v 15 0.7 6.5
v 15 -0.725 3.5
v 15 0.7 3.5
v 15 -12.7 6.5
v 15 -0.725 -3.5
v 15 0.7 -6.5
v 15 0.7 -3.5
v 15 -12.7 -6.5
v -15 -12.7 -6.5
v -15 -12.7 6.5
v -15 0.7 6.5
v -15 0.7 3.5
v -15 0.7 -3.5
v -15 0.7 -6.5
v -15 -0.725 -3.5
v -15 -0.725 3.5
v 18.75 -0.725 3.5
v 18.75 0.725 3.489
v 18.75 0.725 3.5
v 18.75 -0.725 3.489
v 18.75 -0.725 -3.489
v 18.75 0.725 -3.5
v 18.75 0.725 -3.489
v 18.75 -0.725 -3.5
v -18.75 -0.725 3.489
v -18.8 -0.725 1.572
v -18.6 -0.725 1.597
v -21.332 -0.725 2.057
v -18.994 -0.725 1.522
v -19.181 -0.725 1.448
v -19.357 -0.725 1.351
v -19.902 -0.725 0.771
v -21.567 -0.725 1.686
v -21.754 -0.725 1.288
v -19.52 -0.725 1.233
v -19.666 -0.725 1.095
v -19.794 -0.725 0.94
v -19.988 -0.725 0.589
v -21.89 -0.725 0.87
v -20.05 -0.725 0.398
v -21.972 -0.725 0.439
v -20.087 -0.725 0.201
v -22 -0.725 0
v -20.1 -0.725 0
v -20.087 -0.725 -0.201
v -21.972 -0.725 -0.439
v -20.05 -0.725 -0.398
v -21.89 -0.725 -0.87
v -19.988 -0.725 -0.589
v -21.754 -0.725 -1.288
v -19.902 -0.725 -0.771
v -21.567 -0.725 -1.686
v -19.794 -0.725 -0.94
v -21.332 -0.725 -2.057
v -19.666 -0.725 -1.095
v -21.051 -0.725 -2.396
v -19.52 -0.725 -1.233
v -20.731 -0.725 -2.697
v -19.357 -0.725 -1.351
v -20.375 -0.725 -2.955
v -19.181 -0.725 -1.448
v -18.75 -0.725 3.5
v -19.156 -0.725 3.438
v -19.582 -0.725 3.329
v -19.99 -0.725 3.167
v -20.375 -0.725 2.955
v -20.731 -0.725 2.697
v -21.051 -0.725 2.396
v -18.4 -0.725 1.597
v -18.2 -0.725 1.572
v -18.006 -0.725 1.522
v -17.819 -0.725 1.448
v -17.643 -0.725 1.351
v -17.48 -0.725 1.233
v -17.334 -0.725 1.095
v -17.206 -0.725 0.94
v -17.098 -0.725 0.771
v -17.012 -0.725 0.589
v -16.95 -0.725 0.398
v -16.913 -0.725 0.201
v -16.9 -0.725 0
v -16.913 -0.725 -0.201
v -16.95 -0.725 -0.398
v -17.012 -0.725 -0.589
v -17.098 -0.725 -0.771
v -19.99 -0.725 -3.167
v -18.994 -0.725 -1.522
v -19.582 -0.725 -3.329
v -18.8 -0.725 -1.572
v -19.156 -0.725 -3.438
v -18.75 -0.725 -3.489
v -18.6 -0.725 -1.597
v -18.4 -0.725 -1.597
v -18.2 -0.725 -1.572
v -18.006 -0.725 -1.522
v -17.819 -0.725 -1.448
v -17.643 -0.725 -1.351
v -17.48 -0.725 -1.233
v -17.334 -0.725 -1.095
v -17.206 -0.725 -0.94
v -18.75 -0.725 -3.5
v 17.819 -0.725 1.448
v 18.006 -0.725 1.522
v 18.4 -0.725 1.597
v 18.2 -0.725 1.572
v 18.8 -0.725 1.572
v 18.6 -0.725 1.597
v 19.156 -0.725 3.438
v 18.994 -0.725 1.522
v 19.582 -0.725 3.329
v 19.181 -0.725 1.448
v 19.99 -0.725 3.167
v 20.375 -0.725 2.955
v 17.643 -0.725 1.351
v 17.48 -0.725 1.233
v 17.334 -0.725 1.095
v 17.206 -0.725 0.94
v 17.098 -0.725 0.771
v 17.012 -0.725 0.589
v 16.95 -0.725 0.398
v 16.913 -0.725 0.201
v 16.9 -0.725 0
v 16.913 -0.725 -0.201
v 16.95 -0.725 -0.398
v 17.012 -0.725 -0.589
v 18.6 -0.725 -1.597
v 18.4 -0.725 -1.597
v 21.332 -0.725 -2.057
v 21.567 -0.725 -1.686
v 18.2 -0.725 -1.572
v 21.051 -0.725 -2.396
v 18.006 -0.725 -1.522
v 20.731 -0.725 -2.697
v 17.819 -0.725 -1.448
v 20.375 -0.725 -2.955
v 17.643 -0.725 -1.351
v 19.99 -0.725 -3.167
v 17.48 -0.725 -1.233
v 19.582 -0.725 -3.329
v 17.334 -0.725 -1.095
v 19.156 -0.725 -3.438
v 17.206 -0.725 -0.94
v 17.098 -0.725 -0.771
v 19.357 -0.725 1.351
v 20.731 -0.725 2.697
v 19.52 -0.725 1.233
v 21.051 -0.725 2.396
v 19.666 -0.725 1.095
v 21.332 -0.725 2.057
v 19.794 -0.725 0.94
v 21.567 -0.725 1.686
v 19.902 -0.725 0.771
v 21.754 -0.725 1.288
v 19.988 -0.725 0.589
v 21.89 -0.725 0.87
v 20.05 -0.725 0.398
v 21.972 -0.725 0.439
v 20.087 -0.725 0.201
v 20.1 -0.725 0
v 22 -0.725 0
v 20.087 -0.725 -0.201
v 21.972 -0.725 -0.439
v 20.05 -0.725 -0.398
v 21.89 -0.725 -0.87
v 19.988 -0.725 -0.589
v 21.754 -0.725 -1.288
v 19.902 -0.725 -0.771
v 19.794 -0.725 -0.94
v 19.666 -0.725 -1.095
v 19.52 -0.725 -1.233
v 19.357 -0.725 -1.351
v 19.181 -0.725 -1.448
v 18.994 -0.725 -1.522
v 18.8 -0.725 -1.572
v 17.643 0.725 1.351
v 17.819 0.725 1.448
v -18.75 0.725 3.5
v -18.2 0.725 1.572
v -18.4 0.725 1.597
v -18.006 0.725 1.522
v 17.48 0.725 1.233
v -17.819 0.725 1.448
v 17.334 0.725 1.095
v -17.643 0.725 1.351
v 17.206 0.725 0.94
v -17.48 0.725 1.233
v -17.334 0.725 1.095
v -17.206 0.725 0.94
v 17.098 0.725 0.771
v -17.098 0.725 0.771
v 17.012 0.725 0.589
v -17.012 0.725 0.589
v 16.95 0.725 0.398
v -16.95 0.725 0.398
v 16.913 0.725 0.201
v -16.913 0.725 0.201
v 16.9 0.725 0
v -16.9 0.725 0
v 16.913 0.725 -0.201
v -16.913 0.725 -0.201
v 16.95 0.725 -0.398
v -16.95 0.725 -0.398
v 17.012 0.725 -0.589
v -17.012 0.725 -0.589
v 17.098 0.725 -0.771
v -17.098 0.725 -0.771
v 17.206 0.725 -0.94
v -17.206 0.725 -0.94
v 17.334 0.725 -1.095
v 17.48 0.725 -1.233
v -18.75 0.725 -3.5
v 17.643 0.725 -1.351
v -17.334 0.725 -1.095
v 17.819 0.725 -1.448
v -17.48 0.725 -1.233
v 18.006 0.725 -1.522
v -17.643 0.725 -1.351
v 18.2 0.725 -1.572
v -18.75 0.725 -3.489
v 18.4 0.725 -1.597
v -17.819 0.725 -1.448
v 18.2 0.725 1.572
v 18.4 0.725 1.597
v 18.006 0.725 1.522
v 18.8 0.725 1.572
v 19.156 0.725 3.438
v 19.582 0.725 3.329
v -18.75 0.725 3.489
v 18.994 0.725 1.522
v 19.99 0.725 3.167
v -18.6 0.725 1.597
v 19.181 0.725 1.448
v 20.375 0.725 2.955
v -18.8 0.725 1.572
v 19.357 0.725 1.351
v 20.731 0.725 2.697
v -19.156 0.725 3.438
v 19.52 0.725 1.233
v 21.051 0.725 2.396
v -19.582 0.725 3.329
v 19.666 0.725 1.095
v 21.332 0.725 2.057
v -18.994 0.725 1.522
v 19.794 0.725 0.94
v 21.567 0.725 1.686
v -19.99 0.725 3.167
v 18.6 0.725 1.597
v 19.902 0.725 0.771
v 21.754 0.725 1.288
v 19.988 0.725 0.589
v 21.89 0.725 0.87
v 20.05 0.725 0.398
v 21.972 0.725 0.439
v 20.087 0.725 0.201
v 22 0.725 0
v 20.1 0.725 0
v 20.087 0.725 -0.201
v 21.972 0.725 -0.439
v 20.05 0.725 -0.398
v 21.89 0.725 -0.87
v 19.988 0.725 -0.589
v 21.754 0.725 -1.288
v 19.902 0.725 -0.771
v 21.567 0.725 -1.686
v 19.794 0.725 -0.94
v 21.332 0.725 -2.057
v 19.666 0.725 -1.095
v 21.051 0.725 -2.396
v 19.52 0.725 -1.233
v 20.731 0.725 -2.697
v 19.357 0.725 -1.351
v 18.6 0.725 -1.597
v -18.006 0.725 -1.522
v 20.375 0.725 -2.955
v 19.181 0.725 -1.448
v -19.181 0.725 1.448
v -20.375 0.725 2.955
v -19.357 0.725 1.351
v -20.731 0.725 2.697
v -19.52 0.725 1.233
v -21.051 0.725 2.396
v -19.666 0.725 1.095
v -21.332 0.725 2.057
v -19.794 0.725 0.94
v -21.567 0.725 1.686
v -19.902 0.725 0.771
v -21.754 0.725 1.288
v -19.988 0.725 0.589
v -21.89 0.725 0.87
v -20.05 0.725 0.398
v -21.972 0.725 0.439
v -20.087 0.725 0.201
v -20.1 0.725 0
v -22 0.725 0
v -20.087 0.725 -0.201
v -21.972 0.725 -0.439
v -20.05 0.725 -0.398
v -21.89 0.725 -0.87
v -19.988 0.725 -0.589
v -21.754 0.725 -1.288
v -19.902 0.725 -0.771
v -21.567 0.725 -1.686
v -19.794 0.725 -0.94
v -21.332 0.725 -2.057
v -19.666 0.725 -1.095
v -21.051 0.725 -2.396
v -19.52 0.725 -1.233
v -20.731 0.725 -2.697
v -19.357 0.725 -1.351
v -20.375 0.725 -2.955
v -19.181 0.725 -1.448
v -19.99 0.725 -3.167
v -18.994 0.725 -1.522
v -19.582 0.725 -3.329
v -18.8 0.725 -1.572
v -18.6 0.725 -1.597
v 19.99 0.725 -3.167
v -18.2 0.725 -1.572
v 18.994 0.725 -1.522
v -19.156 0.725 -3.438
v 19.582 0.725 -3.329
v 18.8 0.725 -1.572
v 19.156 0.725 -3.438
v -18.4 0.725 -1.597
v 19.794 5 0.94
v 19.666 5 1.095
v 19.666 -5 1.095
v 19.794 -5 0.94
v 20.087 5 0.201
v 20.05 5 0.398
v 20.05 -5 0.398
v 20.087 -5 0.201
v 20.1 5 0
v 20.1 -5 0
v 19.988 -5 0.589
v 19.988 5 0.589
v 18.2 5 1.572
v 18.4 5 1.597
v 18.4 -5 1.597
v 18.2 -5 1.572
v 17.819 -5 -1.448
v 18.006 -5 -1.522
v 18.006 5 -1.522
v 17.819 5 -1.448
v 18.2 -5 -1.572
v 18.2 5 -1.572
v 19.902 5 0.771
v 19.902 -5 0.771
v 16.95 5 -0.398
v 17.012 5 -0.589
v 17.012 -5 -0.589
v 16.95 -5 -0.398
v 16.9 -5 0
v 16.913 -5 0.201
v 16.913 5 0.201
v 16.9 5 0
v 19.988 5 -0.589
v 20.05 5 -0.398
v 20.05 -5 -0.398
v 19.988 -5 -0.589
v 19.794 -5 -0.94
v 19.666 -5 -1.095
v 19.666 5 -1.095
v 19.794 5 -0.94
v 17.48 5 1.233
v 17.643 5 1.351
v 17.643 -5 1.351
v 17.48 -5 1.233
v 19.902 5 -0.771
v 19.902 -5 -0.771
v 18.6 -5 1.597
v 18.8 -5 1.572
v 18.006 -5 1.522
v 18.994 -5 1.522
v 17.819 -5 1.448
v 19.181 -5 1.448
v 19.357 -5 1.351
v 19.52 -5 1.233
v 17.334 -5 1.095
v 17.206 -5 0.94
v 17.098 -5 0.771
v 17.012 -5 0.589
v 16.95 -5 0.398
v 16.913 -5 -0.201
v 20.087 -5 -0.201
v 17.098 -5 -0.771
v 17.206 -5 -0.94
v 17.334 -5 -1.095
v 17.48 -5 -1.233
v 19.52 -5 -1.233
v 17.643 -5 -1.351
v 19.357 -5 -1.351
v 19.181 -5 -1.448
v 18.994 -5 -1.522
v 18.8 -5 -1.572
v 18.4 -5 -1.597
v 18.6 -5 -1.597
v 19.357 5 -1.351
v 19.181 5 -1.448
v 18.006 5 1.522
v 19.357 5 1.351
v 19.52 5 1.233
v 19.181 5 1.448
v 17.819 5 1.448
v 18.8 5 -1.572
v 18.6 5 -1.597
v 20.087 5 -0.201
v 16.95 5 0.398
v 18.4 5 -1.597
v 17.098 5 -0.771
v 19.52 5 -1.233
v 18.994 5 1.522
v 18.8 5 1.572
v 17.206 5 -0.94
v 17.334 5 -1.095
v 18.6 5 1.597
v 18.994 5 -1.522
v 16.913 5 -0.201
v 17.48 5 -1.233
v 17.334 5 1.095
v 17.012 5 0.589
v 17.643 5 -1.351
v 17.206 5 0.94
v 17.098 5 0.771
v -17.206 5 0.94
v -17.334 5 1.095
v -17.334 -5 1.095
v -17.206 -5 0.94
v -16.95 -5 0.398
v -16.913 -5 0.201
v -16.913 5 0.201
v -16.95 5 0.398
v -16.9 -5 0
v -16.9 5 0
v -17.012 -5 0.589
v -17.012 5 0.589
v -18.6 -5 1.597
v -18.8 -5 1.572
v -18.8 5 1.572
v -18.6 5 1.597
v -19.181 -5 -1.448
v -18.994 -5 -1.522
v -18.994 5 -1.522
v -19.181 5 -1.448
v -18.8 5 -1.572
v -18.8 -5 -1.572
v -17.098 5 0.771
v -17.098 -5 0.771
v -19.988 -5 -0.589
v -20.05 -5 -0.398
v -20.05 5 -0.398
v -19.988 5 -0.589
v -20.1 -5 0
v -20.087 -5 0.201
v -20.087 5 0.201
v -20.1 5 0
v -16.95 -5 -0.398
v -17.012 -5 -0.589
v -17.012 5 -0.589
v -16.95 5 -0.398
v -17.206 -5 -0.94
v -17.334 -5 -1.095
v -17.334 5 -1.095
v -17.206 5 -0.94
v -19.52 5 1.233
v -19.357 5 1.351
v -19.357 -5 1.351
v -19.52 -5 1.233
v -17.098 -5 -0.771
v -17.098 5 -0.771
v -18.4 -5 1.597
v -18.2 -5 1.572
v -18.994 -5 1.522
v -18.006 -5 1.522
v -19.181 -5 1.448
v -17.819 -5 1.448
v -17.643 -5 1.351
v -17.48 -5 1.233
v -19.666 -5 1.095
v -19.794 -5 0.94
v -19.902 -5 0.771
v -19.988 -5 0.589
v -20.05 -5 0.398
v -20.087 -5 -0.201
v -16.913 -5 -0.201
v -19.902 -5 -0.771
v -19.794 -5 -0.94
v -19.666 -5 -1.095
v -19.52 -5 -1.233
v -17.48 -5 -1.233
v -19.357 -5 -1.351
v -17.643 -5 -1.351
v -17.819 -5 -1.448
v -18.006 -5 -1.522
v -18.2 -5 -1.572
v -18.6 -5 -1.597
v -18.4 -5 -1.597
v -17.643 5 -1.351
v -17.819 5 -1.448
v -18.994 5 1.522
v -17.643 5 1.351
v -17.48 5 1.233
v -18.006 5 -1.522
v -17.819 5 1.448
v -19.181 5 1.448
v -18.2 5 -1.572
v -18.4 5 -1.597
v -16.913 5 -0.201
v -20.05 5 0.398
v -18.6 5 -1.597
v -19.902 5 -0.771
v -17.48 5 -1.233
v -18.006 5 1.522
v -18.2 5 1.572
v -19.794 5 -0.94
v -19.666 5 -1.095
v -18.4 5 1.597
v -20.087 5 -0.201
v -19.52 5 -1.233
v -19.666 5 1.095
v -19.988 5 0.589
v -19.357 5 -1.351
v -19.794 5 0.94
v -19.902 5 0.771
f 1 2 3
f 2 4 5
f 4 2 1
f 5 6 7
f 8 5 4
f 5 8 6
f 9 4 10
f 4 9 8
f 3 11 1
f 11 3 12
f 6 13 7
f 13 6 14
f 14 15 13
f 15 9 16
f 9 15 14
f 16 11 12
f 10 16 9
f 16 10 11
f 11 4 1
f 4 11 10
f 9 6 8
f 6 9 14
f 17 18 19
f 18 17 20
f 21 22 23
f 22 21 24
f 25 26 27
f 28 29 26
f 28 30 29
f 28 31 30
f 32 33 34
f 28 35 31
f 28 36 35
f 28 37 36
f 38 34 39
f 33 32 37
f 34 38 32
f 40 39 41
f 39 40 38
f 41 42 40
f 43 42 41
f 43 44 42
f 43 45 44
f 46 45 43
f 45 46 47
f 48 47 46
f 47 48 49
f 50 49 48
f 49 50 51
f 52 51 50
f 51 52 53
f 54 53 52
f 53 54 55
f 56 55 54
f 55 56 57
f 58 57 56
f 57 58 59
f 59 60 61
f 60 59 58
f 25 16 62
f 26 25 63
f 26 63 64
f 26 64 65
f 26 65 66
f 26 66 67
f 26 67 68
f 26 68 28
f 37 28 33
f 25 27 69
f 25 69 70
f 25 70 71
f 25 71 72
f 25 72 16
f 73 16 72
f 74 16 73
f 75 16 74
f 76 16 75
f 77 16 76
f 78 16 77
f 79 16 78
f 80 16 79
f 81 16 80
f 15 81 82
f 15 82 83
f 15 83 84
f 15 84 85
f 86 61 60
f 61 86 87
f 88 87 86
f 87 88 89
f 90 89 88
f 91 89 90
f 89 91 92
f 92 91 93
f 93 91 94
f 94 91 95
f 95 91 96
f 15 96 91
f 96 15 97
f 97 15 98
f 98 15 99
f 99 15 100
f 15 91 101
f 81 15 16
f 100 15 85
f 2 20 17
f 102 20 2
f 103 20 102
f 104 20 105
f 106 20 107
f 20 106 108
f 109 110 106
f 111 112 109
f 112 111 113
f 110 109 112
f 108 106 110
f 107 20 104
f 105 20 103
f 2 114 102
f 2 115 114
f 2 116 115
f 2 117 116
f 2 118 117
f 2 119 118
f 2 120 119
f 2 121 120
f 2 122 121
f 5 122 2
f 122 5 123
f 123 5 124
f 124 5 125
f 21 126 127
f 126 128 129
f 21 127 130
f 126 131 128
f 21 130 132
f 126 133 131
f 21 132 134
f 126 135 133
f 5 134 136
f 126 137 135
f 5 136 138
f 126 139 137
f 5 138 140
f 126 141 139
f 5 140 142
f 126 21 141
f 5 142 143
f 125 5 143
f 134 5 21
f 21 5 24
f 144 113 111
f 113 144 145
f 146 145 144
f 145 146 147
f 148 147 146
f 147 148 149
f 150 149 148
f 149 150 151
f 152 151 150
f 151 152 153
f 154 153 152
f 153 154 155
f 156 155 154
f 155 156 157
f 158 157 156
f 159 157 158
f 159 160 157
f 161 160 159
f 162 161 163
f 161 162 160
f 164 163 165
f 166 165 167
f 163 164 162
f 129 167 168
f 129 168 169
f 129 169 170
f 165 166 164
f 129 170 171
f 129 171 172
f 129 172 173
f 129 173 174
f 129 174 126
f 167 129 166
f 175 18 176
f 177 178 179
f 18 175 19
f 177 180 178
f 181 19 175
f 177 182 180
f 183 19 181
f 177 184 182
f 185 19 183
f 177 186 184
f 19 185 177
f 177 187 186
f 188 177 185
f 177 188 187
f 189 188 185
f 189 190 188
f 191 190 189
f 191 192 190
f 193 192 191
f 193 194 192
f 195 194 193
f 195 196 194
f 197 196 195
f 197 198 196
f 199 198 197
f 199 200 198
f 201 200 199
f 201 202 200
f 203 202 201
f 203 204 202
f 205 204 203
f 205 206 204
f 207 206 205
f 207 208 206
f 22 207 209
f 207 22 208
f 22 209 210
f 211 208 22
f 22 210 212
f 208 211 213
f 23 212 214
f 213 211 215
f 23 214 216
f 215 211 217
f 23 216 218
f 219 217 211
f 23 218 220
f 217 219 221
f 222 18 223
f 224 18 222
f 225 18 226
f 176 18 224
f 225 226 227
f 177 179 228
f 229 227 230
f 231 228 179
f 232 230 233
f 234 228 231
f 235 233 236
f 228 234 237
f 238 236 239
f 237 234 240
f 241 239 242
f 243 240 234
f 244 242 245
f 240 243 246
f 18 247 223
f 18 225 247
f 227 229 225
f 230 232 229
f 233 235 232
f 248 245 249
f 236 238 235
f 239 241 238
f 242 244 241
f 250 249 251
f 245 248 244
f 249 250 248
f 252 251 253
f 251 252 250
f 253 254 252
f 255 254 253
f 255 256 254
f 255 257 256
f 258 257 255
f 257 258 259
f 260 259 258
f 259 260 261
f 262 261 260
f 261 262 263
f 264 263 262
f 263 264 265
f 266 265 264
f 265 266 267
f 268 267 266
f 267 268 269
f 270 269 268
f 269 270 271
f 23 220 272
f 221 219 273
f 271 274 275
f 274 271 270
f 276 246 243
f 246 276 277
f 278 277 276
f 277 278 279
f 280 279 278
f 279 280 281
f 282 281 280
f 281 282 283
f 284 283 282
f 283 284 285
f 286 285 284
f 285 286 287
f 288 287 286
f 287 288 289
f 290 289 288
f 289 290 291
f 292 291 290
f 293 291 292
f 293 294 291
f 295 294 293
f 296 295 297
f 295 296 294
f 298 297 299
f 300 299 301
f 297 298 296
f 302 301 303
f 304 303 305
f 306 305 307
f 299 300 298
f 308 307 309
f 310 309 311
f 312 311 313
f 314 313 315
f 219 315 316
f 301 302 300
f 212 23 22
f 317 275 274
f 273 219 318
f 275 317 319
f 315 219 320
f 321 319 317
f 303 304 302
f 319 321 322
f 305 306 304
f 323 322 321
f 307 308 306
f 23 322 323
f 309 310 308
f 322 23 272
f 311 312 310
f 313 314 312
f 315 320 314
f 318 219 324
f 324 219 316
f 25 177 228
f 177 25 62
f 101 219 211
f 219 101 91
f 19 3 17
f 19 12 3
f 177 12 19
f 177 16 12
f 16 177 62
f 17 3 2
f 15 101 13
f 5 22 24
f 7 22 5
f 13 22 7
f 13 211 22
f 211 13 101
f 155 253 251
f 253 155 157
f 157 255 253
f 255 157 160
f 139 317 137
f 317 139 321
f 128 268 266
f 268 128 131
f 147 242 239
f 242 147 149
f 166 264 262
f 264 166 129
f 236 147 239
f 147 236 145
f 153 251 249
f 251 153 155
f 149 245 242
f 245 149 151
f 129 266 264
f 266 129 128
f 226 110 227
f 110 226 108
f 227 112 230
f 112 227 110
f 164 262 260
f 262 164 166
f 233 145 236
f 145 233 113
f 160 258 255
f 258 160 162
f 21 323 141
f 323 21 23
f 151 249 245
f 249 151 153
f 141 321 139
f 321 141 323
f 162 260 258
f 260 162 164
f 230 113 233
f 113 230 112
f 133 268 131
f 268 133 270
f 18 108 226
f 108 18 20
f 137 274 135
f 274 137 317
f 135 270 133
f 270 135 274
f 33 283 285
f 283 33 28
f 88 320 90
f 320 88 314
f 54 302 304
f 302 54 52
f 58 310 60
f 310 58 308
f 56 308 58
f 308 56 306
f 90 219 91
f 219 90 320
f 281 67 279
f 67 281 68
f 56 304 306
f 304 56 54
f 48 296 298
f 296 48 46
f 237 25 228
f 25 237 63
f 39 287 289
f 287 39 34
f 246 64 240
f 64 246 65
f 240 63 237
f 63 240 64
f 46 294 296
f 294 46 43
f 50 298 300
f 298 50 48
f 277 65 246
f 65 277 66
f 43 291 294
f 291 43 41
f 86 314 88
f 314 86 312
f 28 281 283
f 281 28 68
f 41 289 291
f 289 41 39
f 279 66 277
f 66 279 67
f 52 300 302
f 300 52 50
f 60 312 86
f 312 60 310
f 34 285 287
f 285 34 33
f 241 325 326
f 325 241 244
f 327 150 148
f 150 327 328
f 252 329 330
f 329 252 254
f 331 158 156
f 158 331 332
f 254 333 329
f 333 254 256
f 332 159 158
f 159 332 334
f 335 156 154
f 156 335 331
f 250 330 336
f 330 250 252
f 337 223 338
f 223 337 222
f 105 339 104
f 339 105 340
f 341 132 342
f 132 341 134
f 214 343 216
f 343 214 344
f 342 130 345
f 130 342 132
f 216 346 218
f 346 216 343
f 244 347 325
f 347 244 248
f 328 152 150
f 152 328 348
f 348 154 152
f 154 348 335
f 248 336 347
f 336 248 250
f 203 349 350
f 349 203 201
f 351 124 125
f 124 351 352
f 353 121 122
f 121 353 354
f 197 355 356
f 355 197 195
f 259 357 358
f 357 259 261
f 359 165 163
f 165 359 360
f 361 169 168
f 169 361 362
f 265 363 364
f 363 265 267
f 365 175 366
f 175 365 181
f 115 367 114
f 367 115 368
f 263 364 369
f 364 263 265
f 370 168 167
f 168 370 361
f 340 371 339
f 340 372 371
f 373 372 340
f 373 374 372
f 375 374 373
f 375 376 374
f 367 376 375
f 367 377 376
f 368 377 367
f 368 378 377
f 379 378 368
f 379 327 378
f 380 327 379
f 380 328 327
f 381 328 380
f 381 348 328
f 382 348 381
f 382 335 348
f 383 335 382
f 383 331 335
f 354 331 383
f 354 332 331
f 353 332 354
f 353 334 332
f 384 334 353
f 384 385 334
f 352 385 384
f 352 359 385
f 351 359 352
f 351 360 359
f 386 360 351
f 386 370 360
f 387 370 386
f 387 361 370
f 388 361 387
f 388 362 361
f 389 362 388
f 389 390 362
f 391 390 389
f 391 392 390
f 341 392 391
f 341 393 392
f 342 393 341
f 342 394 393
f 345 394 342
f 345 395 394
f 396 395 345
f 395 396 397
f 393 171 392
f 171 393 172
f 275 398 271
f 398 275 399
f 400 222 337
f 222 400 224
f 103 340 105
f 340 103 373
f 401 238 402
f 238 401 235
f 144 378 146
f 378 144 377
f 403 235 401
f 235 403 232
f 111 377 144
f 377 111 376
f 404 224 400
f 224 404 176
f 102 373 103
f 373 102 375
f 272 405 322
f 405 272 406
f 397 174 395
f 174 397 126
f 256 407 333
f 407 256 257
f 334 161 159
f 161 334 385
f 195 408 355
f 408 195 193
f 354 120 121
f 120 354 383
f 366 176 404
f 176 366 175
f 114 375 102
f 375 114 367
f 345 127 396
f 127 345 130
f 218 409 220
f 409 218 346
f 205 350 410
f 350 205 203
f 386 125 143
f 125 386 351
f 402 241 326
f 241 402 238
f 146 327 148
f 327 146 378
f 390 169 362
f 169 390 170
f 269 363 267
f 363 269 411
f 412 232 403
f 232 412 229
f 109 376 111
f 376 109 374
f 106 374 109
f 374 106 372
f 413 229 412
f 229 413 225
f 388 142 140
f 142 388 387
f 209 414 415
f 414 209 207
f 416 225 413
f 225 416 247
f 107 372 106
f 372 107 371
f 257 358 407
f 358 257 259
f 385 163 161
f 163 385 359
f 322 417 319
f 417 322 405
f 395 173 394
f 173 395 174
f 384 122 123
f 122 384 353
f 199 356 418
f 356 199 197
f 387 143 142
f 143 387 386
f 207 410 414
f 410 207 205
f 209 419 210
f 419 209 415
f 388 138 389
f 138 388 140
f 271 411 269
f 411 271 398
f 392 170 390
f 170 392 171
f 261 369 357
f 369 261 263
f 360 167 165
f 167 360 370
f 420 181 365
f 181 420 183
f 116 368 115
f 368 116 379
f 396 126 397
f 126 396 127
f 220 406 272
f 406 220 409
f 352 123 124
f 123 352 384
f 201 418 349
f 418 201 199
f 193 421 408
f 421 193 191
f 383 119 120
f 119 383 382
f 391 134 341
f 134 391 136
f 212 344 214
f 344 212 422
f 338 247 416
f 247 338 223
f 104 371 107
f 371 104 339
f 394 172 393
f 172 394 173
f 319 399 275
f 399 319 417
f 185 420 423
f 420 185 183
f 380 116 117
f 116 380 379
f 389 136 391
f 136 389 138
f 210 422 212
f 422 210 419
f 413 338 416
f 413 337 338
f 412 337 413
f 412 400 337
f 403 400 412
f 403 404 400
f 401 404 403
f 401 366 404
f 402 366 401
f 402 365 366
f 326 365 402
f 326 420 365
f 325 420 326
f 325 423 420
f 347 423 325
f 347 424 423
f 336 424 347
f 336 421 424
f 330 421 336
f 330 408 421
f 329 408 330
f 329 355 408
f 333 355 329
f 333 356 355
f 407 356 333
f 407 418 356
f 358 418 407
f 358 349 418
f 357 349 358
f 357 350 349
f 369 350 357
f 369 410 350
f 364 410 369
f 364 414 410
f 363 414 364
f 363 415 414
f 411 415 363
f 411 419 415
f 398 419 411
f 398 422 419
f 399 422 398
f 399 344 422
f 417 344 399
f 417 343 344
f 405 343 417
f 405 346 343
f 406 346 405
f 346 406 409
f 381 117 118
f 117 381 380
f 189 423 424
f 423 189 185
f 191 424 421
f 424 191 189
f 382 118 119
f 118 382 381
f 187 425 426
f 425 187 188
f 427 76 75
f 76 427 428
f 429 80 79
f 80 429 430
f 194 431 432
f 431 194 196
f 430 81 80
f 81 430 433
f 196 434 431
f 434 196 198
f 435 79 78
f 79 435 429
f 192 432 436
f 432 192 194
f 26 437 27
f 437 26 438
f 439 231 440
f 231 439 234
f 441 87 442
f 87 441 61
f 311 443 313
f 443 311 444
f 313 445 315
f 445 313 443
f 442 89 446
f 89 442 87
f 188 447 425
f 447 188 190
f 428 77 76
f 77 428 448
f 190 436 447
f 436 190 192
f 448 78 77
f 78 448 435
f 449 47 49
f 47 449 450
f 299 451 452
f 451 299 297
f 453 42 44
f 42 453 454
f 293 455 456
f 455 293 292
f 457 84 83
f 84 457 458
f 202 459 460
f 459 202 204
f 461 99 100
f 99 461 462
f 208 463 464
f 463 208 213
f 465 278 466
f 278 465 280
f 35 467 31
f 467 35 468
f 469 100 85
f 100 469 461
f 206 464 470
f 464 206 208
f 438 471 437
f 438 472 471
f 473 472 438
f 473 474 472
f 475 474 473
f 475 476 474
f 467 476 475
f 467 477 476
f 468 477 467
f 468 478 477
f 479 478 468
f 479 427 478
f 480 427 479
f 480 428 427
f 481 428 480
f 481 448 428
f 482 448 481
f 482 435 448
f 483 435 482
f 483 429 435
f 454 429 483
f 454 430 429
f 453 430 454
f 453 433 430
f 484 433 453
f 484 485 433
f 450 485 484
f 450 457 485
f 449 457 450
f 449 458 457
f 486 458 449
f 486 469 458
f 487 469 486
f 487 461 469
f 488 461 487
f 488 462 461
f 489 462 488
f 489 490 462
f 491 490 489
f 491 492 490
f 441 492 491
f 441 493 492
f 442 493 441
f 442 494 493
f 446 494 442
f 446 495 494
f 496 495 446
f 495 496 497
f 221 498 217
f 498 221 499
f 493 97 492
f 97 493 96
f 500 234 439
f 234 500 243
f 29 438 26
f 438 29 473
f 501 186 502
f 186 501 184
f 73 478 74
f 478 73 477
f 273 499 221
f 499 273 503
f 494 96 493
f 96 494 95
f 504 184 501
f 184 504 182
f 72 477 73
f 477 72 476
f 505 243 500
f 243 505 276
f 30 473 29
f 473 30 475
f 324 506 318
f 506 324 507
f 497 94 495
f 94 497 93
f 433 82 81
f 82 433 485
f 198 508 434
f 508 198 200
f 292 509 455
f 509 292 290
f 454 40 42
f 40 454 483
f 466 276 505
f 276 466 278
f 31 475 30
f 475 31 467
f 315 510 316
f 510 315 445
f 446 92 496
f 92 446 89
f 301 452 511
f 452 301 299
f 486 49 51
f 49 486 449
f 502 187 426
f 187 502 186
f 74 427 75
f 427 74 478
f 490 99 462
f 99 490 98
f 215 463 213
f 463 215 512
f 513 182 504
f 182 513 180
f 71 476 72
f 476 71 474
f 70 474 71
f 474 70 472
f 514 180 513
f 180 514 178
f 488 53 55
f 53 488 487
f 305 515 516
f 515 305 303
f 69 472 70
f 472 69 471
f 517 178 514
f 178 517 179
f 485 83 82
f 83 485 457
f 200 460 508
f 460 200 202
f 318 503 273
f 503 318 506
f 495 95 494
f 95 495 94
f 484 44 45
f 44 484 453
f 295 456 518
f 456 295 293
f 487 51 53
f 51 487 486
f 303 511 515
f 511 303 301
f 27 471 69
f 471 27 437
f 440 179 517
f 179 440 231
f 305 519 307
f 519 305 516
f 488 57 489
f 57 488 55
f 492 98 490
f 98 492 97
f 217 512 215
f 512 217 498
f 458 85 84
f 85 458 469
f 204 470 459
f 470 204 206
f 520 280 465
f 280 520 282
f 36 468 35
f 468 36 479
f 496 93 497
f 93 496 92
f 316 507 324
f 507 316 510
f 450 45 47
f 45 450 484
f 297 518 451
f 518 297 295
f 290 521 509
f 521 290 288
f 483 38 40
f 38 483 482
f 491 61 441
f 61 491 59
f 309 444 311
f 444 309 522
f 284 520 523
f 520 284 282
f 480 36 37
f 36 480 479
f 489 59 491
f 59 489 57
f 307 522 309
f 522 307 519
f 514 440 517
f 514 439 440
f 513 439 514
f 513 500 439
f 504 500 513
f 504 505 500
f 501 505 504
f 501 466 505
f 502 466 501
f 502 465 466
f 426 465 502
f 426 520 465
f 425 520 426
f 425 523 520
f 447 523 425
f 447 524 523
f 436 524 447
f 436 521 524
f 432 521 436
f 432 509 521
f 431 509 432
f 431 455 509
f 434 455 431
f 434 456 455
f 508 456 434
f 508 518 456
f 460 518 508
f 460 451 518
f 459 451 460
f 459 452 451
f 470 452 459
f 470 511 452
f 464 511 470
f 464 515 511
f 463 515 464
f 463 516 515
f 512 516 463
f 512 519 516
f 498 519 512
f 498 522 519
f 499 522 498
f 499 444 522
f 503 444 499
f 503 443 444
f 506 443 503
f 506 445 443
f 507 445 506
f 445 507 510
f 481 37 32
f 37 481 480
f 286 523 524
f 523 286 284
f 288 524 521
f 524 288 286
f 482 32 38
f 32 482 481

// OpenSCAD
$fn = 50;

module screwholes(){
    translate([18.5,0,0]){
        cylinder(10, d =3.2 ,center = true);
    }
     translate([-18.5,0,0]){
        cylinder(10, d=3.2 ,center = true);
    }

}
module shortir(){
    rotate([90,0,0]){
 
        union(){
            translate([0,0,6]){
                cube([30,13,13.4], center = true);  
            }

            cube([37.5,7, 1.45], center = true);           
             translate([18.5,0,0]){
                    cylinder(1.45, d =7 ,center = true);
                }
                translate([-18.5,0,0]){
                    cylinder(1.45, d=7 ,center = true);
                }   

        }

        screwholes();
    
    }
}
shortir();
